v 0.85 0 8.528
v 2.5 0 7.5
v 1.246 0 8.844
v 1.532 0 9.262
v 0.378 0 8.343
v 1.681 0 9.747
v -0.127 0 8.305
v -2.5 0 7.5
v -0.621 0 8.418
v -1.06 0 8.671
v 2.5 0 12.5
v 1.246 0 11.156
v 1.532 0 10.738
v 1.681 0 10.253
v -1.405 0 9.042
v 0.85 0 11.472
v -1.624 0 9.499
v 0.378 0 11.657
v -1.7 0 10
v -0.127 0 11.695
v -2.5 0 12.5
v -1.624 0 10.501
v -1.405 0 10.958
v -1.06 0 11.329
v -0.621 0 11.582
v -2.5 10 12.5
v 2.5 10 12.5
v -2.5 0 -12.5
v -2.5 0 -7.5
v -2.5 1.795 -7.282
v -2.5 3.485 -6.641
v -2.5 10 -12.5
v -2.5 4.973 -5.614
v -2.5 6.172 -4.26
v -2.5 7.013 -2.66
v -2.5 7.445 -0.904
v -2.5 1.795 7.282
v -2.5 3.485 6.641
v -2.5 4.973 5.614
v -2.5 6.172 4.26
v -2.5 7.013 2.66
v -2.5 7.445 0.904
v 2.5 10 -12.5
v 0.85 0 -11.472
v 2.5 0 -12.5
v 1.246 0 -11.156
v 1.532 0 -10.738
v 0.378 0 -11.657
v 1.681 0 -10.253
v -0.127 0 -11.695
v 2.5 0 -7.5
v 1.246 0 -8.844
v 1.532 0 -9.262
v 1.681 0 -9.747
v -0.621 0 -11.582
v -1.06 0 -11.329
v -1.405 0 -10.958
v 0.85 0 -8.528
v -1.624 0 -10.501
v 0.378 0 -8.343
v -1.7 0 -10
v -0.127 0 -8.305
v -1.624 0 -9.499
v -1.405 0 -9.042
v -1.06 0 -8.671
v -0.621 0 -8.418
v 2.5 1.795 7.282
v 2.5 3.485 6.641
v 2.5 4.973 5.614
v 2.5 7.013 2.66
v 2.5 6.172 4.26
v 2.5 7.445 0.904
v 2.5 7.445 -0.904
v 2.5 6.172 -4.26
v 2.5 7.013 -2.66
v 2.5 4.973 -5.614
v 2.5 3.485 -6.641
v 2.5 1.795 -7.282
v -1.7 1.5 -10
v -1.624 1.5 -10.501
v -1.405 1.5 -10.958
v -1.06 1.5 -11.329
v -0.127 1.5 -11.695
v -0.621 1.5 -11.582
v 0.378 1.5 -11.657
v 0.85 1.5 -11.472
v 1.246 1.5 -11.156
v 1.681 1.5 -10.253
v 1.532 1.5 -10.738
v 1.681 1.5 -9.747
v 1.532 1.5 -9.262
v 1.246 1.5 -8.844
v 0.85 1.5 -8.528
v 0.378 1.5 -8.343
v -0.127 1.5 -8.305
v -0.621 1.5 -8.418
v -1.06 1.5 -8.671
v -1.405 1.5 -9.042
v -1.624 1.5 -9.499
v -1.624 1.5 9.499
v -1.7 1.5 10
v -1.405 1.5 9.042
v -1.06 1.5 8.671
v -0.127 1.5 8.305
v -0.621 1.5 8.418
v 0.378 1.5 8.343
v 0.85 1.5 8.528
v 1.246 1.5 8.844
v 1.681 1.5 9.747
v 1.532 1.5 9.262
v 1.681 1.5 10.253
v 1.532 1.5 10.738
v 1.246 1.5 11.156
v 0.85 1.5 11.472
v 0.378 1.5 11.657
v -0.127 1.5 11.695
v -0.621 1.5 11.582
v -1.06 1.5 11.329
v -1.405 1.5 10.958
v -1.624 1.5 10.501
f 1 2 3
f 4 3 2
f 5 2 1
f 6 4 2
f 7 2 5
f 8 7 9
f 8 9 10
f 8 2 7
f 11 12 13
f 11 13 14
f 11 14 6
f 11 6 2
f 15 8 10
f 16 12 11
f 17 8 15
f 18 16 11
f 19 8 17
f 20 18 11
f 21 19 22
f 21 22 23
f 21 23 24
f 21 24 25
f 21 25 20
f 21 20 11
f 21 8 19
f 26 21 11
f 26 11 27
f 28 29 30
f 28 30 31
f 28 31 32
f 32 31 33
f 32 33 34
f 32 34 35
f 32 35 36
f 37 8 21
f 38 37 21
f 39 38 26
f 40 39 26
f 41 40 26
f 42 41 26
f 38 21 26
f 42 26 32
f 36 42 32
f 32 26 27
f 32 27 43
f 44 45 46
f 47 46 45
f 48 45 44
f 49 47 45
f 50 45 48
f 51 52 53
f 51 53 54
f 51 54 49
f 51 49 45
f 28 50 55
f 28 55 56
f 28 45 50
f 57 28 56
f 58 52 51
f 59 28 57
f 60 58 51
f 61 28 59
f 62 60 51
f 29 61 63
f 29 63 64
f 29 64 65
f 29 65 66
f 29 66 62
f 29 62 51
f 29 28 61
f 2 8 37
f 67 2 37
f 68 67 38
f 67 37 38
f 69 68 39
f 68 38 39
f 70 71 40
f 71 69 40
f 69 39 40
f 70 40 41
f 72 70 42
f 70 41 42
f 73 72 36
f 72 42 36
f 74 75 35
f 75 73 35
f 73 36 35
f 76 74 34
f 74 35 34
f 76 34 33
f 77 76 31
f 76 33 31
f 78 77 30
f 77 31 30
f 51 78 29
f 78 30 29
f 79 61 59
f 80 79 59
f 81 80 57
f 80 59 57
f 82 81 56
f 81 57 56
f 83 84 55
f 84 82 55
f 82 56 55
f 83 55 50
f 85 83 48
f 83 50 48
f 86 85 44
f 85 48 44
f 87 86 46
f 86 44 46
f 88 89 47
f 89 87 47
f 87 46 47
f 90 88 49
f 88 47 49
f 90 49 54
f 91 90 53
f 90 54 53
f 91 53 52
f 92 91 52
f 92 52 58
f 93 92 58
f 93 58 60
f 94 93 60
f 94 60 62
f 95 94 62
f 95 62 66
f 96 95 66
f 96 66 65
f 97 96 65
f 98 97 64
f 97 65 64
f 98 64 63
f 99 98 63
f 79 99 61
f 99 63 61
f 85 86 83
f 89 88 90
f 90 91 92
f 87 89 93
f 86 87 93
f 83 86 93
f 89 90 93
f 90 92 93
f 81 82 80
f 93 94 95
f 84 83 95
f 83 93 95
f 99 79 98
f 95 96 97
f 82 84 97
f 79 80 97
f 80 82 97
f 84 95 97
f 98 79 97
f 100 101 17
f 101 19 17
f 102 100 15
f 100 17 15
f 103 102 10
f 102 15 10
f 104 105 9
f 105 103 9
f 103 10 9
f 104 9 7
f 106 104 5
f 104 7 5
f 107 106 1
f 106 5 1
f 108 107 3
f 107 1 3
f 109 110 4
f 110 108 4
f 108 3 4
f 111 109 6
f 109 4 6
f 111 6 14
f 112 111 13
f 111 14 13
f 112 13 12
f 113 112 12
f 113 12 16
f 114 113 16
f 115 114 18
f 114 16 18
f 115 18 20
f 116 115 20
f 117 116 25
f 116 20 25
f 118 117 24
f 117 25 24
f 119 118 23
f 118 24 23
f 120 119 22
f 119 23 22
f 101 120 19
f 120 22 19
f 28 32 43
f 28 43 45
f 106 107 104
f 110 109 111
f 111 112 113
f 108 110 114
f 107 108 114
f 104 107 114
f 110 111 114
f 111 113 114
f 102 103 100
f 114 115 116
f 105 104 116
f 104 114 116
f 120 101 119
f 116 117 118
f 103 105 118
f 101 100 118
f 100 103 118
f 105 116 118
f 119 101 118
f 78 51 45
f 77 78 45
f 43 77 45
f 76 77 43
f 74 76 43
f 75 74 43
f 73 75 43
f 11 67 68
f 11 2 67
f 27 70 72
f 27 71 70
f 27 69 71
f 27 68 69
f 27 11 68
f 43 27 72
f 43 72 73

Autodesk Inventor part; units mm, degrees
ref_plane "YZ Plane" through (0, 0, 0) normal (1, 0, 0) x (0, 1, 0)
ref_plane "XZ Plane" through (0, 0, 0) normal (0, 1, 0) x (-1, 0, 0)
ref_plane "XY Plane" through (0, 0, 0) normal (0, 0, 1) x (1, 0, 0)
sketch "草圖1" plane through (0, 0, 0) normal (0, 1, 0) x (-1, 0, 0)
  line L0 (2.5, 12.5) -> (-2.5, 12.5)
  line L1 (-2.5, 12.5) -> (-2.5, -12.5)
  line L2 (-2.5, -12.5) -> (2.5, -12.5)
  line L3 (2.5, -12.5) -> (2.5, 12.5)
  circle A0 centre (0, 10) radius 1.7
  circle A1 centre (0, 5) radius 1.7
  circle A2 centre (0, 0) radius 1.7
  circle A3 centre (0, -5) radius 1.7
  circle A4 centre (0, -10) radius 1.7
  point P0 (0, 0)
  point P1 (2.5, 0)
  point P2 (0, 12.5)
  dimension "d0" = 5
  dimension "d1" = 25
  dimension "d2" = 3.4
  dimension "d3" = 2.5
  dimension "d4" = 2.5
  dimension "d7" = 5
sketch "草圖2" plane through (0, 0, 0) normal (1, 0, 0) x (0, 1, 0)
  line L0 (0, -12.5) -> (0, 12.5) projected
  circle A0 centre (0, 0) radius 7.5
  line L1 (0, 12.5) -> (10, 12.5)
  line L2 (10, 12.5) -> (10, -12.5)
  line L3 (10, -12.5) -> (0, -12.5)
  point P0 (0, 10)
  point P1 (0, 5)
  point P2 (0, -5)
  point P3 (0, -10)
  point P4 (0, 7.5)
  point P5 (0, -7.5)
  dimension "d12" = 15
  dimension "d13" = 10
extrude "擠出1" add sketch "草圖2" along normal mid plane 5 contours L0 A0 L1 L2 L3
extrude "擠出2" cut sketch "草圖1" along normal blind 1.5 contours A0 | A4
properties part number "110033226_ipt_09_窗戶圓拱"
